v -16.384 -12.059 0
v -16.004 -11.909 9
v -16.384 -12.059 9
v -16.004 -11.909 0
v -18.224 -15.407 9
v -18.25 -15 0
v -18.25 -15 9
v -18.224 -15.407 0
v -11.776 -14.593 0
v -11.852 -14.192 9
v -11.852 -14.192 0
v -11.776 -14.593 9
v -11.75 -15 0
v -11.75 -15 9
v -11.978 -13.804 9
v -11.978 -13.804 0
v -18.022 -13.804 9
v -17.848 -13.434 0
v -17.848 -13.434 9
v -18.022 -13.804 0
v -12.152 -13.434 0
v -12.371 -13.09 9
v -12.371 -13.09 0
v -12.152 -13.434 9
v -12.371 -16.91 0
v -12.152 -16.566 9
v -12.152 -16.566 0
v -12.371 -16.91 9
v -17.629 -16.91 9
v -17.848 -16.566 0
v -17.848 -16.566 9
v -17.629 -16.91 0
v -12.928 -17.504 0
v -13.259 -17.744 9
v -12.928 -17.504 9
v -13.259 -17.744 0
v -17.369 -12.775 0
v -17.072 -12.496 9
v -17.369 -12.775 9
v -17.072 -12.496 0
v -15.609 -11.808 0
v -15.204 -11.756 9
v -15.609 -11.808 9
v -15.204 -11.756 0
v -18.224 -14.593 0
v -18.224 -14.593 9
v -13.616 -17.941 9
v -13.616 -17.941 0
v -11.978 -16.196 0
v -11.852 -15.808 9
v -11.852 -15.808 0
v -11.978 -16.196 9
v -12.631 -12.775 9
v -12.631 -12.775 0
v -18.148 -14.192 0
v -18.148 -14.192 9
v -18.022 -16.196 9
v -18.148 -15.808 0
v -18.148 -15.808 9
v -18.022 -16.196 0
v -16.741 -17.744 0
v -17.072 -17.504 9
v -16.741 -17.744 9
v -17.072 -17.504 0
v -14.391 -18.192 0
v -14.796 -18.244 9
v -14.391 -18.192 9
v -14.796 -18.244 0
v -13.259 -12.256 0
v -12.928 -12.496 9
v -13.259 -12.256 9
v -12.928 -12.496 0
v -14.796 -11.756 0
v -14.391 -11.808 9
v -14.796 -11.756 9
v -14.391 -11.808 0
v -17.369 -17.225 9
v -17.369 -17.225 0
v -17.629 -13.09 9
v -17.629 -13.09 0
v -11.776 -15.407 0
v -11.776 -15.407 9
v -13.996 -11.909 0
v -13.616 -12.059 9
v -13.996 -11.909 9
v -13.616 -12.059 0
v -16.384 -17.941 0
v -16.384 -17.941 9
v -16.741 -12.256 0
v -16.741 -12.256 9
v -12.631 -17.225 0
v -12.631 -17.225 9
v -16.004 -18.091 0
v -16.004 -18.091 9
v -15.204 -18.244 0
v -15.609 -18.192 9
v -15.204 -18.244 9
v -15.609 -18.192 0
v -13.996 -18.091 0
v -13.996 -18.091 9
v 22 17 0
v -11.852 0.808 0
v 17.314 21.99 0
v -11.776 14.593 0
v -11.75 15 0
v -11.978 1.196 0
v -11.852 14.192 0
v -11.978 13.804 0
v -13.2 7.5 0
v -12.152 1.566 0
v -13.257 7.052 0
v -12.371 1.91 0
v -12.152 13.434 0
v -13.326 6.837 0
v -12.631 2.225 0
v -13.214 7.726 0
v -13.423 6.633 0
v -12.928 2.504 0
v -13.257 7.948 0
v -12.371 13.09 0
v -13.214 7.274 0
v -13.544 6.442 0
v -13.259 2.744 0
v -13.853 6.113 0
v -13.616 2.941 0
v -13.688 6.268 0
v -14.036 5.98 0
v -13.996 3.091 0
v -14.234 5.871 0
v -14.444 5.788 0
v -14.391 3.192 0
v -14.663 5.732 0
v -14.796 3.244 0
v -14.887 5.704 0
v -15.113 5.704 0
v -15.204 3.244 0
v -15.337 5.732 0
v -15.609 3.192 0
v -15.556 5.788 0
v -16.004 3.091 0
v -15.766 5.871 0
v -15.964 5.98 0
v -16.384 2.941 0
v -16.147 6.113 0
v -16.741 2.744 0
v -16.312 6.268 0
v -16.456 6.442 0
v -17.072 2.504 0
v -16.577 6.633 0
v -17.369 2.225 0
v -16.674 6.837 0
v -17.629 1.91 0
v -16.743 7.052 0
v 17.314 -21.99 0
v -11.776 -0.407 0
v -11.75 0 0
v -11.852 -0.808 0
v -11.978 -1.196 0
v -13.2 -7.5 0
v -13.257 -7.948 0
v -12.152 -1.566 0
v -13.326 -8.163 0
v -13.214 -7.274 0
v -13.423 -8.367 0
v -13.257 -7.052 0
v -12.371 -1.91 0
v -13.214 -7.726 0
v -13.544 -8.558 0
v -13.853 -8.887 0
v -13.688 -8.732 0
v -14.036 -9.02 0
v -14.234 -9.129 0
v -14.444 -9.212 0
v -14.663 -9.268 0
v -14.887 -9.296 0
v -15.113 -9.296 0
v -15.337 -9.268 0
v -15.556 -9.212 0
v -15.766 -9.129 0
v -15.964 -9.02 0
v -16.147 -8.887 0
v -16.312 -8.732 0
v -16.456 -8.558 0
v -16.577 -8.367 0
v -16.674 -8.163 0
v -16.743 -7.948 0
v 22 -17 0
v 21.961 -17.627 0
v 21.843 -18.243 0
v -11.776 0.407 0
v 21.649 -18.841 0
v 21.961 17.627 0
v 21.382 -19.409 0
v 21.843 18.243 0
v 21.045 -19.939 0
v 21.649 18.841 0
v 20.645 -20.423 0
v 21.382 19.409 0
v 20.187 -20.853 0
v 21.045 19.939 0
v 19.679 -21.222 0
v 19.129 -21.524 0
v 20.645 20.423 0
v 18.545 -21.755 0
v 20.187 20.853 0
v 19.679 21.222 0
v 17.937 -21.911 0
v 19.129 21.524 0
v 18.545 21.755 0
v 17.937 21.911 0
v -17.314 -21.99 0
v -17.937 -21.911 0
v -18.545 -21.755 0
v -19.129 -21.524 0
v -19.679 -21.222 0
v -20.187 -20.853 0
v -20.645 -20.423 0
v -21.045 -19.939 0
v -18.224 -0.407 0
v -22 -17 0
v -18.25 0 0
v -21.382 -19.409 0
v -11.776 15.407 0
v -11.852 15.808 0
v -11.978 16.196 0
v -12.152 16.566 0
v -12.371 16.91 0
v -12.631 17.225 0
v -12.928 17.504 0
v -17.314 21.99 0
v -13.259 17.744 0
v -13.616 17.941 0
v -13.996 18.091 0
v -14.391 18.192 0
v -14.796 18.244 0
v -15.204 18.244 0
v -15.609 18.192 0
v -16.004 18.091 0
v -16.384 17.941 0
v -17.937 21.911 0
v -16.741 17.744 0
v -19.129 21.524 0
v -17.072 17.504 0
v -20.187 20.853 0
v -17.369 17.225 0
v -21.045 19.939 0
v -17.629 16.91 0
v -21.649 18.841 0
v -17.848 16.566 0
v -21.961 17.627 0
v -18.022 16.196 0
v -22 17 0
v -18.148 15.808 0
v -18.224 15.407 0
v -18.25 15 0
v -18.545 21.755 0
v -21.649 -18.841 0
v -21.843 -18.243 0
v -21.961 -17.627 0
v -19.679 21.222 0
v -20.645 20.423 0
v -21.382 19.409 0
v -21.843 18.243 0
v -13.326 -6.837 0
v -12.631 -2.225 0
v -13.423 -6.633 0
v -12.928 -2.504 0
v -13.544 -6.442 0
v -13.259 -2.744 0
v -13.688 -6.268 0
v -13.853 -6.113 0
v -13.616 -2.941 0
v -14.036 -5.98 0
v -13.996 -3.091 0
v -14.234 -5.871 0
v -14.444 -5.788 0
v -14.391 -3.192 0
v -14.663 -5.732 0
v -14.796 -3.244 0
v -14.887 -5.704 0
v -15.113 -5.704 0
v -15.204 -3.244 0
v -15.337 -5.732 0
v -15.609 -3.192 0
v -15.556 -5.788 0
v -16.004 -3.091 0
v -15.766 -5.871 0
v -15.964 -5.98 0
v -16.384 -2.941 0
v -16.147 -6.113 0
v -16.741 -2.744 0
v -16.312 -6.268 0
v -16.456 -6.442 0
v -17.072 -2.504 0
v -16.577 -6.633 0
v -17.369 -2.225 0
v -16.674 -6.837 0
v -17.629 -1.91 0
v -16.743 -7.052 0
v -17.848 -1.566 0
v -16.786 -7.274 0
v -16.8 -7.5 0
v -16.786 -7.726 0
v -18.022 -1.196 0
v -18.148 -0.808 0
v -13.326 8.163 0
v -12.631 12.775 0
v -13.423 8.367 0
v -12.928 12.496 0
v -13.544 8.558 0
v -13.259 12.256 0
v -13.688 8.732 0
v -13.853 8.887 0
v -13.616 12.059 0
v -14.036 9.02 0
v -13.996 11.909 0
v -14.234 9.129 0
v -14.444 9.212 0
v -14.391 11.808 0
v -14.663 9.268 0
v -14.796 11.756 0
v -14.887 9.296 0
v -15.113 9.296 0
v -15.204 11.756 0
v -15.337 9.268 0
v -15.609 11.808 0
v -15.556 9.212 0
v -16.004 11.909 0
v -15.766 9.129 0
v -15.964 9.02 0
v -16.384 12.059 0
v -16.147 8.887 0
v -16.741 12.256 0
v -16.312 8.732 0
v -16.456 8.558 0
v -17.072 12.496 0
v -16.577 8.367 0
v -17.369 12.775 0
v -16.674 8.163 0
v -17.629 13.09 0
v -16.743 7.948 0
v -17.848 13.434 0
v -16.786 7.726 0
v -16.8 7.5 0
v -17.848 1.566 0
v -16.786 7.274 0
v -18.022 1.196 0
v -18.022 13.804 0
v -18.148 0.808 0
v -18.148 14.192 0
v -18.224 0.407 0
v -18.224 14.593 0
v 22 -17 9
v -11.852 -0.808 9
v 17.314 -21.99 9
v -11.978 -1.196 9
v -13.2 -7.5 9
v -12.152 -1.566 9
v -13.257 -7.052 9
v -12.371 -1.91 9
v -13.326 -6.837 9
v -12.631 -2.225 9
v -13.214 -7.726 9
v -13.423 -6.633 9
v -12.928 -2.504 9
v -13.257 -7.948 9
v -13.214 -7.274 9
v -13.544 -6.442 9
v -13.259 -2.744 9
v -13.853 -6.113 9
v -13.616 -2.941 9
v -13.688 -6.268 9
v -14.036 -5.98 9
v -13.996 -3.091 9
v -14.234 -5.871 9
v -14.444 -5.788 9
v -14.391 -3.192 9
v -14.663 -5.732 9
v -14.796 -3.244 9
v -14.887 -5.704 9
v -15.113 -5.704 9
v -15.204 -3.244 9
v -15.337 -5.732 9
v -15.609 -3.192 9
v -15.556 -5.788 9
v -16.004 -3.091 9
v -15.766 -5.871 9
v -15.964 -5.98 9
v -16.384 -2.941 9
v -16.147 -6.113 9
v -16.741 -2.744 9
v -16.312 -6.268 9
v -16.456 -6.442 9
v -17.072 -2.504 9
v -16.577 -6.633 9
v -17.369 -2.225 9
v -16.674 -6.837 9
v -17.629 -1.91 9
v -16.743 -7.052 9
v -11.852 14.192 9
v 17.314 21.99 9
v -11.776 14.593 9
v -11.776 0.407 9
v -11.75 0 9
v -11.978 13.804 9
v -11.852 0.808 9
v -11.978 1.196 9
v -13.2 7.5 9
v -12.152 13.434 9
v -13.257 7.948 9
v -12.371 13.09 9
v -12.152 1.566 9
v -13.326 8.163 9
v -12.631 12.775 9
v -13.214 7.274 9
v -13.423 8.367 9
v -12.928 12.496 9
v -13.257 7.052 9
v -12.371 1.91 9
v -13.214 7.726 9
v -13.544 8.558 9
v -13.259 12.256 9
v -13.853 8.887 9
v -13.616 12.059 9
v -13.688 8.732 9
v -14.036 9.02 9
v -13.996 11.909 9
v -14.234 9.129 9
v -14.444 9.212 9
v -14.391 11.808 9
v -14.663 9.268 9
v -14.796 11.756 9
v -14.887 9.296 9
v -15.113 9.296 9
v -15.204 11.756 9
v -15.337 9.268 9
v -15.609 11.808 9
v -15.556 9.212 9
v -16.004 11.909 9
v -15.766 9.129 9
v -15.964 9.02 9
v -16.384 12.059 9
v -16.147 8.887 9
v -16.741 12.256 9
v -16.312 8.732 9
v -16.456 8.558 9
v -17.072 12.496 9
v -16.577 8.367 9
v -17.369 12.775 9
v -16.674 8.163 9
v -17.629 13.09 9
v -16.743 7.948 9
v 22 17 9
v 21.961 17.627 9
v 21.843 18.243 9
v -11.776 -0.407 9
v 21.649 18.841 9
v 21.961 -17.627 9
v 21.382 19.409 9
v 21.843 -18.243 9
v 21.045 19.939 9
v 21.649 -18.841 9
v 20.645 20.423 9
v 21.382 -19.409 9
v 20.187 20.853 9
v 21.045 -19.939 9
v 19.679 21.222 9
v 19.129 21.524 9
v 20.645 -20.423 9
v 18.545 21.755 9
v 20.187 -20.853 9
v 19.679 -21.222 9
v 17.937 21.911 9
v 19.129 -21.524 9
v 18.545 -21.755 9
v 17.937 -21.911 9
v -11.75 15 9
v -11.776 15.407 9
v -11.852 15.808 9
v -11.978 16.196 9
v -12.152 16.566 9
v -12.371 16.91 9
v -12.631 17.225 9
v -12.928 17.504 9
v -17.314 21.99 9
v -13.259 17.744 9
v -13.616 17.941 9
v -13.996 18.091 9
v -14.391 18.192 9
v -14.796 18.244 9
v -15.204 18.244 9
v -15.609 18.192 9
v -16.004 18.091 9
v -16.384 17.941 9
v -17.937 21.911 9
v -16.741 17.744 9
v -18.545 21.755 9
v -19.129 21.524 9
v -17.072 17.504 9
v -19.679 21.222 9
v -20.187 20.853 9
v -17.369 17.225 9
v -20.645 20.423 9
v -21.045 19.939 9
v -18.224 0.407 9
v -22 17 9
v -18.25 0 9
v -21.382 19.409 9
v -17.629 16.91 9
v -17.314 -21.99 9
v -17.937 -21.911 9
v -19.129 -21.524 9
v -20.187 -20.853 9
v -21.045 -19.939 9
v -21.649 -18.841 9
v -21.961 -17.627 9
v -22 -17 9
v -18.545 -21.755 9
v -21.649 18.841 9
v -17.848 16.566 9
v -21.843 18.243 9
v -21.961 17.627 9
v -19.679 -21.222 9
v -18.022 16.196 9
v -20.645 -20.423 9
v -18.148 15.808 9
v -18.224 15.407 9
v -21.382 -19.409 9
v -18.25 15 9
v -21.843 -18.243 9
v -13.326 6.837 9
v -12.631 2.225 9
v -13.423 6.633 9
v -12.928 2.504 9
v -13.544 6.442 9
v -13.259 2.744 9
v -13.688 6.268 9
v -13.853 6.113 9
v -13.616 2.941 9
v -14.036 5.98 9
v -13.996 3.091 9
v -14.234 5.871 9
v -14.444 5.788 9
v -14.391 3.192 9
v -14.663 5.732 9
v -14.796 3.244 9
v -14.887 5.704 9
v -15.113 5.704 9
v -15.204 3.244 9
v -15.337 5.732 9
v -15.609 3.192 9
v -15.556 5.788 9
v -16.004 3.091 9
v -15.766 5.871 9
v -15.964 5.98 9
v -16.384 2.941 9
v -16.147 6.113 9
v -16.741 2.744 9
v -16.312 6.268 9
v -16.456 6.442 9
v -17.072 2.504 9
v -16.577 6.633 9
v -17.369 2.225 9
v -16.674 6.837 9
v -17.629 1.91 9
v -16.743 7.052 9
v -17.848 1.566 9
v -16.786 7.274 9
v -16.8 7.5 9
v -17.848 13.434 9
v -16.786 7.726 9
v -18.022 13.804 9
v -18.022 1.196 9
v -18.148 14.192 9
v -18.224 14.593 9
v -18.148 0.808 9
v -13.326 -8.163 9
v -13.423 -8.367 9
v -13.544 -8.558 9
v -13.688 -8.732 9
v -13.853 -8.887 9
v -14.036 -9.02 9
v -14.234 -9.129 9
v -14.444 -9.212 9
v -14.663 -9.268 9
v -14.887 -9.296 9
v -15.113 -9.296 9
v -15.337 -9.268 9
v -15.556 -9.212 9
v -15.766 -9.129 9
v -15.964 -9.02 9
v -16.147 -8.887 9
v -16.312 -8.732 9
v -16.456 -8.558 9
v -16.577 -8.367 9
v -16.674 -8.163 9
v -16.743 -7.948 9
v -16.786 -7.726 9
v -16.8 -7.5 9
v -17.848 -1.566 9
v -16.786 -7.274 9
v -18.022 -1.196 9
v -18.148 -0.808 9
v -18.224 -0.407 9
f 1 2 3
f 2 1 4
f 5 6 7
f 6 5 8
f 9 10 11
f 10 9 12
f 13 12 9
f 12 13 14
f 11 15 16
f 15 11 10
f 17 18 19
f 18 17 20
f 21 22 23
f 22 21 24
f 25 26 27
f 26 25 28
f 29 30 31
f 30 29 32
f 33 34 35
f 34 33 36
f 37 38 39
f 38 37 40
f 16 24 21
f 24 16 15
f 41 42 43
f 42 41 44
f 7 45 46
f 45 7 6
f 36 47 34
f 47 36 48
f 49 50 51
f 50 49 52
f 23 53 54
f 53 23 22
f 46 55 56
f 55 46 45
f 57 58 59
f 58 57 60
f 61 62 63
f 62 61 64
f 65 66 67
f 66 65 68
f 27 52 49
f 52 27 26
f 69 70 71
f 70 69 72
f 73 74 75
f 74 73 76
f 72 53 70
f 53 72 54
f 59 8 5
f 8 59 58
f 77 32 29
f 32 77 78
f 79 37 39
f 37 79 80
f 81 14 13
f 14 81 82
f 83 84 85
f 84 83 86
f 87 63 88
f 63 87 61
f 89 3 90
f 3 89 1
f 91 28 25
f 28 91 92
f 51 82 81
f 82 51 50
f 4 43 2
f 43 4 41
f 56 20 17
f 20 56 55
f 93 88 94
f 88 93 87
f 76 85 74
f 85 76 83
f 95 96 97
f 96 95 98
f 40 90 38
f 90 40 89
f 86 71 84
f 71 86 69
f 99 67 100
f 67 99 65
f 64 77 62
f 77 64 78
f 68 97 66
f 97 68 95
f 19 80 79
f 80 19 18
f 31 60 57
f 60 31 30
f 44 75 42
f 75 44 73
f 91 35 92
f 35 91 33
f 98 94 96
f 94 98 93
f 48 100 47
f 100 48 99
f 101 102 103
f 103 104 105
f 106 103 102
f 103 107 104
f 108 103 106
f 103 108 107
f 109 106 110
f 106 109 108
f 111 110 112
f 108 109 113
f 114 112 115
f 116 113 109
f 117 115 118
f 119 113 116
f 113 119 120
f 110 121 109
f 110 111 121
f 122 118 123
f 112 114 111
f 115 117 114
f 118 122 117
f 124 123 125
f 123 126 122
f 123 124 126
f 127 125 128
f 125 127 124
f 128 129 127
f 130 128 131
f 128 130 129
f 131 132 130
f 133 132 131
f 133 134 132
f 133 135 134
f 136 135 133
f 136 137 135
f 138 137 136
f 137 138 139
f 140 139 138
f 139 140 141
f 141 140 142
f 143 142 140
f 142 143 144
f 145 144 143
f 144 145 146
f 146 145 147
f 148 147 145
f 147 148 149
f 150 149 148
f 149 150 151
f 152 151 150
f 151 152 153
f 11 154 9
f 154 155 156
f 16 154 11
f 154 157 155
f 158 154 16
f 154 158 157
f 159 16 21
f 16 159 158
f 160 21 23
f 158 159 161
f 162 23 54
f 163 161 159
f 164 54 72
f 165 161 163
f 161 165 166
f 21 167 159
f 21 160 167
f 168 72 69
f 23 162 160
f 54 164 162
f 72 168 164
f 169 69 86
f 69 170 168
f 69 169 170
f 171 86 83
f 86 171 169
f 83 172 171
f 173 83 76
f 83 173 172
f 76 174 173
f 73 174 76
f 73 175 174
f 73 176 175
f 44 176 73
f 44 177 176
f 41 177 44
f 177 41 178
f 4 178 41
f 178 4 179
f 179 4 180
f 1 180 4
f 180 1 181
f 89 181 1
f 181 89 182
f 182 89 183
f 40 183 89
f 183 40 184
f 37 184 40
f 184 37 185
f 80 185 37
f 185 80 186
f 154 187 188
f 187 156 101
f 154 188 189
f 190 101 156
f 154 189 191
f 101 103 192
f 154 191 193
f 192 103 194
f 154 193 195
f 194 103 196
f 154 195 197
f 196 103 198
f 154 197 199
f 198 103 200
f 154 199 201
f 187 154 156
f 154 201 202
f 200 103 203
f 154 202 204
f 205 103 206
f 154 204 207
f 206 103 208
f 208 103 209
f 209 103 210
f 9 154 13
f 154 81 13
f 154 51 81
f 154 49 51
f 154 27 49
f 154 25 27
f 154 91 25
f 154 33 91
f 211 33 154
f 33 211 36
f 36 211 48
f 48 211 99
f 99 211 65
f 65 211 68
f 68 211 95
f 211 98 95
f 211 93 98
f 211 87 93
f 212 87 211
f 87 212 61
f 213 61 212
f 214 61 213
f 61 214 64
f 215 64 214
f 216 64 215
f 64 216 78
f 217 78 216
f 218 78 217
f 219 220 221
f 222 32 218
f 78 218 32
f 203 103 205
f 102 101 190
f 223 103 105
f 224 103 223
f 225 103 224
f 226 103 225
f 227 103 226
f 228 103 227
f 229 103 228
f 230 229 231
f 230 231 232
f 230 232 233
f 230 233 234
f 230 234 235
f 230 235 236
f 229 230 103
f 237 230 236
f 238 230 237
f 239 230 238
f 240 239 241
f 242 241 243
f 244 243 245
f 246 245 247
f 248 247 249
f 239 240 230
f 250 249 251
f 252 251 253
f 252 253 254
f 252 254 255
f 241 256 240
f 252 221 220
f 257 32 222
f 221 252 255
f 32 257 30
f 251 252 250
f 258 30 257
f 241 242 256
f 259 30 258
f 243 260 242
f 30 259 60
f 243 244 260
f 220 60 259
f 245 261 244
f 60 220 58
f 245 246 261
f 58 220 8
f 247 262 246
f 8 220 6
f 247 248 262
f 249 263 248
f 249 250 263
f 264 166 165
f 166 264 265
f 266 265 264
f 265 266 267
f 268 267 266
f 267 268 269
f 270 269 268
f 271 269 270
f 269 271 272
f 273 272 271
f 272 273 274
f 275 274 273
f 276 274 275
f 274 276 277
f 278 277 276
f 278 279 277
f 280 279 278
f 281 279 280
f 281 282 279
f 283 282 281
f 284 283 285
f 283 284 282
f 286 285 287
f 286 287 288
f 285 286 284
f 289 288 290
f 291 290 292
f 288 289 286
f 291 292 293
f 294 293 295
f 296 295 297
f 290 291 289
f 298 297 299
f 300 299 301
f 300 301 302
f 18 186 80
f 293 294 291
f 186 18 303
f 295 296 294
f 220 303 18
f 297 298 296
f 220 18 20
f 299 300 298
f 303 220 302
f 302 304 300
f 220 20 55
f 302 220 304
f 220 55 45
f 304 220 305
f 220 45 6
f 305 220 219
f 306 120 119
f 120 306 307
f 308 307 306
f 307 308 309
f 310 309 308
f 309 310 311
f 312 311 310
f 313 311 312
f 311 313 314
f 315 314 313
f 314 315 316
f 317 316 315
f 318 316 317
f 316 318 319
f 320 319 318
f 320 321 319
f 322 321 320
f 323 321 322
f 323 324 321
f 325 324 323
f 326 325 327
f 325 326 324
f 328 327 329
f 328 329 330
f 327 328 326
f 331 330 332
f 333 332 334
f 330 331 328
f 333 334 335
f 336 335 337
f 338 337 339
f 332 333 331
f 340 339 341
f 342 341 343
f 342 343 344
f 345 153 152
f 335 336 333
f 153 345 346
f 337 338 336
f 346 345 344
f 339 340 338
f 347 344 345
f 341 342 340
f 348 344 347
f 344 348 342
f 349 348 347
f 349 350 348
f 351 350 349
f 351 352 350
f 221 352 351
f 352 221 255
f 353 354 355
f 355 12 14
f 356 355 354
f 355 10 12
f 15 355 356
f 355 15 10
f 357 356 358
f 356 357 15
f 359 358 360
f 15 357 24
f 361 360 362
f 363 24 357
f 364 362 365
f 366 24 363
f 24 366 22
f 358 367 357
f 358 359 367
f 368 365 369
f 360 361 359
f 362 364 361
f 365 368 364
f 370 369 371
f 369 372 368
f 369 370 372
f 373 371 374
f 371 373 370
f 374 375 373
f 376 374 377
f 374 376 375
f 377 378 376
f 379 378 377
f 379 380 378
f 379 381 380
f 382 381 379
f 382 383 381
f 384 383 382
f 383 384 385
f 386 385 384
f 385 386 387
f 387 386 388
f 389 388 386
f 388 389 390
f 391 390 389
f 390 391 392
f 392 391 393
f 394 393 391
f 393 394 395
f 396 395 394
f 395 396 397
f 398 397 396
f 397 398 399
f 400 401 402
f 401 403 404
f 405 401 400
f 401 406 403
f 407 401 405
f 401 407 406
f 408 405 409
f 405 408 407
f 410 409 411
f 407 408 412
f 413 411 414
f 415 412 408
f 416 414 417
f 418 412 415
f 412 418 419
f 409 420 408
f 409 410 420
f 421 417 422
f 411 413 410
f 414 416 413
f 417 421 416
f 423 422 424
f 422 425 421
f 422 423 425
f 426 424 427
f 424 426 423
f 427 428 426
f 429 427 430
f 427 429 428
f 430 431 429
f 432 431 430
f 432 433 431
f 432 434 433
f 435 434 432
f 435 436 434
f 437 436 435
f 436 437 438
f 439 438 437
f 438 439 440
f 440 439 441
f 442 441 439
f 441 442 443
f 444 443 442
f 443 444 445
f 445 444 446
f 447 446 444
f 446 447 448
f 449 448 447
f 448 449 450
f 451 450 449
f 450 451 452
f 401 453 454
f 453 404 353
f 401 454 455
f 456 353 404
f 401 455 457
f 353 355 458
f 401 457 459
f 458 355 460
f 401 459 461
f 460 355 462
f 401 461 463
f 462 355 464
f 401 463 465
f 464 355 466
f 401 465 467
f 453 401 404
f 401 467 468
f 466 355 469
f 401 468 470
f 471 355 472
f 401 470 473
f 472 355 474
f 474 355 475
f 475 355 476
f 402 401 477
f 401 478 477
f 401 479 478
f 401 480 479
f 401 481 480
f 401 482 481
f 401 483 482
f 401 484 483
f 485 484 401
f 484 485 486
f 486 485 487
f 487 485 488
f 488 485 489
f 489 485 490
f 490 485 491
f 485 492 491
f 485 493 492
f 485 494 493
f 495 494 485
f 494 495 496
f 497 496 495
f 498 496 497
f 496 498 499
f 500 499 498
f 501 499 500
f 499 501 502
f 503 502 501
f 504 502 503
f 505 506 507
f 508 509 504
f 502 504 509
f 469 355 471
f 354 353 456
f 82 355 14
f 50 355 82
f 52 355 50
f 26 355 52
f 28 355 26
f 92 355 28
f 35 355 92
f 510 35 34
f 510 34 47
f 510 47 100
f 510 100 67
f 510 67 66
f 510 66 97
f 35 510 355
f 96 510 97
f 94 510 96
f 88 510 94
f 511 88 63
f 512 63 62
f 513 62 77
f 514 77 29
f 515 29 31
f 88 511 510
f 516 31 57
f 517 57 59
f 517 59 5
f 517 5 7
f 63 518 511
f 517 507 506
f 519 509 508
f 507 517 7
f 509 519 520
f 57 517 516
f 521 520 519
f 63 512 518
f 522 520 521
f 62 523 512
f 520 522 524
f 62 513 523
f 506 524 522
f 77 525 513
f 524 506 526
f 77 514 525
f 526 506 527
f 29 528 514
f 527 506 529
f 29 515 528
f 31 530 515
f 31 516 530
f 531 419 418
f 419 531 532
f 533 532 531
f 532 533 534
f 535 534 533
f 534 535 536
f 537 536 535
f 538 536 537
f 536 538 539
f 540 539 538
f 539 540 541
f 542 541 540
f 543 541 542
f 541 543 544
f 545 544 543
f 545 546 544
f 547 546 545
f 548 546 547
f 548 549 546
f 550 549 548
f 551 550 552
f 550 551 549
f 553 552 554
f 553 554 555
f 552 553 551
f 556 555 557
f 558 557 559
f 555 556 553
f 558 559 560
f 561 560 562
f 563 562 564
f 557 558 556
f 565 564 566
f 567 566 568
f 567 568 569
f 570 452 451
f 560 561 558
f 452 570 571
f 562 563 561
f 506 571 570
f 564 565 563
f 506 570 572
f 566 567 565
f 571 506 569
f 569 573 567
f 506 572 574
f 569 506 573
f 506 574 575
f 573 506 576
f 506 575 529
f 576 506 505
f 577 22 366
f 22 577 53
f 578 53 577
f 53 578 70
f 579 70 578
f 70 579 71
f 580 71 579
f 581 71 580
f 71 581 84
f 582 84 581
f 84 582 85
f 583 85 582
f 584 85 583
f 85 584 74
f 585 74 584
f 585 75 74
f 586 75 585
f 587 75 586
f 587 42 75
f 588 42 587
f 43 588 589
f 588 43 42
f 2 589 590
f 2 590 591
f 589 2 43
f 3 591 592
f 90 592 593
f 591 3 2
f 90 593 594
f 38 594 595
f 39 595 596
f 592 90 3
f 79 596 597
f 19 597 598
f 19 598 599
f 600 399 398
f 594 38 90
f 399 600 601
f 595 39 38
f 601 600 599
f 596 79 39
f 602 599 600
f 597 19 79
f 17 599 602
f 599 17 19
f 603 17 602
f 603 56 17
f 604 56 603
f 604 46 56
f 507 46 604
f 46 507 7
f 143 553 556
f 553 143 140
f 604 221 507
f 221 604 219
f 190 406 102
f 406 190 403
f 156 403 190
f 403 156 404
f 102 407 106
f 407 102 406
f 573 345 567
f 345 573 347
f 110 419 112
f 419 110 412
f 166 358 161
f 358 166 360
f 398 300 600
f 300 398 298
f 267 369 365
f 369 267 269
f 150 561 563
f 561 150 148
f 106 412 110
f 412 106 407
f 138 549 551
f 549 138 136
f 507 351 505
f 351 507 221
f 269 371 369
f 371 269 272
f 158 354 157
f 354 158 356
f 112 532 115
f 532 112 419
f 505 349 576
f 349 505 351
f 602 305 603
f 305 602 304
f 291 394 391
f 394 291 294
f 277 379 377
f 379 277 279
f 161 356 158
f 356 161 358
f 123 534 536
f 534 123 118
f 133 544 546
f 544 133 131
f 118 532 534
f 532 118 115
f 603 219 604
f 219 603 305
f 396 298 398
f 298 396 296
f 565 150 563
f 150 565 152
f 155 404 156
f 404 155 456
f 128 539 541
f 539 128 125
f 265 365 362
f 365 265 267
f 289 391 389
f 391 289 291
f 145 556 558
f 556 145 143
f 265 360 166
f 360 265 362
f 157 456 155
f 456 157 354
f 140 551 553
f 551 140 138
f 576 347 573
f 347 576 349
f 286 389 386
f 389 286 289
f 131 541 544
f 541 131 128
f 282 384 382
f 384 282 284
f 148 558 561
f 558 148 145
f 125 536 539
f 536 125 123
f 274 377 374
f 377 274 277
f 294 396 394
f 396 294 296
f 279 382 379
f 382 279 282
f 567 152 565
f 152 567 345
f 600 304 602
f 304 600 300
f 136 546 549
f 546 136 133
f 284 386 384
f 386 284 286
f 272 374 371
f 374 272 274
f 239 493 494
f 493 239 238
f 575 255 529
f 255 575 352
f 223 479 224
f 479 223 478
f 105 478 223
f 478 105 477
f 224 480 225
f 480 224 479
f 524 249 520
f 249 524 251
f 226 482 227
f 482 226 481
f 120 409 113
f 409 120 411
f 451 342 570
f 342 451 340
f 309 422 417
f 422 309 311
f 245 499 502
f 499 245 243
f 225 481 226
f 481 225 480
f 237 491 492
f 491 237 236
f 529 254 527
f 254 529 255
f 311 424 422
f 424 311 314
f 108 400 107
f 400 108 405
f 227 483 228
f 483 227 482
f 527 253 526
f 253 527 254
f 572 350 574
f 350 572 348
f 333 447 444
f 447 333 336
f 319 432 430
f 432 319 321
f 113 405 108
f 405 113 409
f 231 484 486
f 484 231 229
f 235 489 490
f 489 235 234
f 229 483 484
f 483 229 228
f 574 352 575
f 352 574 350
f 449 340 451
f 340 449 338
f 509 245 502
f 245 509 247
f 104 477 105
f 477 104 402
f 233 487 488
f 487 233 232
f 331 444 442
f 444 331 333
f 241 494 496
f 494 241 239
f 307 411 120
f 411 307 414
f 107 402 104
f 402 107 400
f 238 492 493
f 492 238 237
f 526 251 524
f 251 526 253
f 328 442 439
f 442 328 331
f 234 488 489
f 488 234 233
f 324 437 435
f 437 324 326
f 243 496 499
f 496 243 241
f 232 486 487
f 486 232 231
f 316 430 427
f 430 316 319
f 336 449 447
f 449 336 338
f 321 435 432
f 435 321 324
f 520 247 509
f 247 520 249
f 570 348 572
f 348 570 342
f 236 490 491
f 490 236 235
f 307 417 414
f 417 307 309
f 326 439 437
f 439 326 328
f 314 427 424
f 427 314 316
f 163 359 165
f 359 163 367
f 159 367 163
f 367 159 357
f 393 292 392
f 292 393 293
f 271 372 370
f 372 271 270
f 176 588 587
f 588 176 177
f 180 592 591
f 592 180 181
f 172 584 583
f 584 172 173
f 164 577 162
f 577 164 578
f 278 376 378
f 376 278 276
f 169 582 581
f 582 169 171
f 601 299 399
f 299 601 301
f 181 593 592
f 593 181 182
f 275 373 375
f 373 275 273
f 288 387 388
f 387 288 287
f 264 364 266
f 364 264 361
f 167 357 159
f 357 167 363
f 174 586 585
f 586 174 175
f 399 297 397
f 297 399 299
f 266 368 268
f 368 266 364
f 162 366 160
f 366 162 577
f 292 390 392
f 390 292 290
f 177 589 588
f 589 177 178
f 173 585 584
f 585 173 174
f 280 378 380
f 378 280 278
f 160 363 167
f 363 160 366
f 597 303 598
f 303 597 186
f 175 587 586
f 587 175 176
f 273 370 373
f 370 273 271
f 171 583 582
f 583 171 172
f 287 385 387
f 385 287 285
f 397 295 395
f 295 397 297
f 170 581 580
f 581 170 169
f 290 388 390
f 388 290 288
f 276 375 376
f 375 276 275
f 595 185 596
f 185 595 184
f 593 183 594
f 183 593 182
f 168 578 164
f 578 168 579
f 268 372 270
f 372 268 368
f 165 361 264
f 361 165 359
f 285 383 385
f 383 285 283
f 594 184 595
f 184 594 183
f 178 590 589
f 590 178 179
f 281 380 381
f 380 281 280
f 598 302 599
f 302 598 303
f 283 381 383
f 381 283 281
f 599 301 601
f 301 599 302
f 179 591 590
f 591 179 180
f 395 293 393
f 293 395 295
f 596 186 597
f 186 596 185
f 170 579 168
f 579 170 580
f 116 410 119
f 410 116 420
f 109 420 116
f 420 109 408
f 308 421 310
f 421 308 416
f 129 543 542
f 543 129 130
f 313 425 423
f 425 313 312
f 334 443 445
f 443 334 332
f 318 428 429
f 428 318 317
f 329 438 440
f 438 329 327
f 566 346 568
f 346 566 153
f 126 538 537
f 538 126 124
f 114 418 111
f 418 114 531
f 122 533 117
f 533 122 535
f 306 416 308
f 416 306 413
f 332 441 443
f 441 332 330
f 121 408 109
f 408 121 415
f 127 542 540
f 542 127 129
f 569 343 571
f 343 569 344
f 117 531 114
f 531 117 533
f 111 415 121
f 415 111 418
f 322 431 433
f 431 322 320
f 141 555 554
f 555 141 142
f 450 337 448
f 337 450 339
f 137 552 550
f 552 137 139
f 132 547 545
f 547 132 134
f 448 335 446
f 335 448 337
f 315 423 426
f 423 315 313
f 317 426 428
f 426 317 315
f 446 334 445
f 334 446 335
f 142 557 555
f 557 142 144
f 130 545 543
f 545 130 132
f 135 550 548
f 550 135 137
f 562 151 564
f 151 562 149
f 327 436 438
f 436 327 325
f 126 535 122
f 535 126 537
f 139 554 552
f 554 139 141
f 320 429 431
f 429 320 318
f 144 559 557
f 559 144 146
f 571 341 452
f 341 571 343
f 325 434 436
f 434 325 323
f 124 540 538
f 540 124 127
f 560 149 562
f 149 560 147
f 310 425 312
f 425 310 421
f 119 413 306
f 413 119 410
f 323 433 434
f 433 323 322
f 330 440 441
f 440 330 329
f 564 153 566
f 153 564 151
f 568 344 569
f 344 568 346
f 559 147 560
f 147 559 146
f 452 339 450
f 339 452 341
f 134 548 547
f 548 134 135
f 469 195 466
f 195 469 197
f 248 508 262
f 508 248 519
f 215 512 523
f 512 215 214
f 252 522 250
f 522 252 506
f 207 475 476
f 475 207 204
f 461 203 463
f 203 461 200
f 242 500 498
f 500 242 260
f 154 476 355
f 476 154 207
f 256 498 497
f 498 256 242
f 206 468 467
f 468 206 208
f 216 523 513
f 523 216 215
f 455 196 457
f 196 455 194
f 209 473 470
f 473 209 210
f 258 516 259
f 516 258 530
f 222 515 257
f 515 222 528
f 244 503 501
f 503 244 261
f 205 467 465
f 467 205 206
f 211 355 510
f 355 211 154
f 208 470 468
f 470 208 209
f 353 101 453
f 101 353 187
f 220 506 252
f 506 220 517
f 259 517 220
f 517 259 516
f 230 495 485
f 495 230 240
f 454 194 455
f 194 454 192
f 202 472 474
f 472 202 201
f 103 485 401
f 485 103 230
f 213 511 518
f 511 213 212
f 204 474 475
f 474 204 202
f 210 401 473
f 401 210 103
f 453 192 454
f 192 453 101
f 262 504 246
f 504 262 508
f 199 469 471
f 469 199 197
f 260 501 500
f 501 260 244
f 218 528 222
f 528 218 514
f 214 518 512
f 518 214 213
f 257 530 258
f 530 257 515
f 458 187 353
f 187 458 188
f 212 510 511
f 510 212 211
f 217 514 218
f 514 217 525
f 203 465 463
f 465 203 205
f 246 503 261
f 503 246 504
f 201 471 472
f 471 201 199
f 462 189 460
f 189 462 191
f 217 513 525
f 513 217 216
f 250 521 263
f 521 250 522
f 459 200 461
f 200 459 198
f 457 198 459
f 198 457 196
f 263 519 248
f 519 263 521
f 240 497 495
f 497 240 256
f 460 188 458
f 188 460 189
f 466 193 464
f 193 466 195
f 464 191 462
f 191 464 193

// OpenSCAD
$fn = 50;


difference() {
	union() {
		hull() {
			translate(v = [-17.0000000000, 17.0000000000, 0]) {
				cylinder(h = 9, r = 5);
			}
			translate(v = [17.0000000000, 17.0000000000, 0]) {
				cylinder(h = 9, r = 5);
			}
			translate(v = [-17.0000000000, -17.0000000000, 0]) {
				cylinder(h = 9, r = 5);
			}
			translate(v = [17.0000000000, -17.0000000000, 0]) {
				cylinder(h = 9, r = 5);
			}
		}
	}
	union() {
		translate(v = [-15.0000000000, -15.0000000000, 0]) {
			cylinder(h = 9, r = 3.2500000000);
		}
		translate(v = [-15.0000000000, 0.0000000000, 0]) {
			cylinder(h = 9, r = 3.2500000000);
		}
		translate(v = [-15.0000000000, 15.0000000000, 0]) {
			cylinder(h = 9, r = 3.2500000000);
		}
		translate(v = [-15.0000000000, -15.0000000000, 0]) {
			cylinder(h = 9, r = 1.8000000000);
		}
		translate(v = [-15.0000000000, -7.5000000000, 0]) {
			cylinder(h = 9, r = 1.8000000000);
		}
		translate(v = [-15.0000000000, 0.0000000000, 0]) {
			cylinder(h = 9, r = 1.8000000000);
		}
		translate(v = [-15.0000000000, 7.5000000000, 0]) {
			cylinder(h = 9, r = 1.8000000000);
		}
		translate(v = [-15.0000000000, 15.0000000000, 0]) {
			cylinder(h = 9, r = 1.8000000000);
		}
		translate(v = [-15.0000000000, -15.0000000000, 0]) {
			cylinder(h = 9, r = 1.8000000000);
		}
		translate(v = [-15.0000000000, -7.5000000000, 0]) {
			cylinder(h = 9, r = 1.8000000000);
		}
		translate(v = [-15.0000000000, 0.0000000000, 0]) {
			cylinder(h = 9, r = 1.8000000000);
		}
		translate(v = [-15.0000000000, 7.5000000000, 0]) {
			cylinder(h = 9, r = 1.8000000000);
		}
		translate(v = [-15.0000000000, 15.0000000000, 0]) {
			cylinder(h = 9, r = 1.8000000000);
		}
		translate(v = [-15.0000000000, -15.0000000000, 0]) {
			cylinder(h = 9, r = 1.8000000000);
		}
		translate(v = [-15.0000000000, -7.5000000000, 0]) {
			cylinder(h = 9, r = 1.8000000000);
		}
		translate(v = [-15.0000000000, 0.0000000000, 0]) {
			cylinder(h = 9, r = 1.8000000000);
		}
		translate(v = [-15.0000000000, 7.5000000000, 0]) {
			cylinder(h = 9, r = 1.8000000000);
		}
		translate(v = [-15.0000000000, 15.0000000000, 0]) {
			cylinder(h = 9, r = 1.8000000000);
		}
	}
}
